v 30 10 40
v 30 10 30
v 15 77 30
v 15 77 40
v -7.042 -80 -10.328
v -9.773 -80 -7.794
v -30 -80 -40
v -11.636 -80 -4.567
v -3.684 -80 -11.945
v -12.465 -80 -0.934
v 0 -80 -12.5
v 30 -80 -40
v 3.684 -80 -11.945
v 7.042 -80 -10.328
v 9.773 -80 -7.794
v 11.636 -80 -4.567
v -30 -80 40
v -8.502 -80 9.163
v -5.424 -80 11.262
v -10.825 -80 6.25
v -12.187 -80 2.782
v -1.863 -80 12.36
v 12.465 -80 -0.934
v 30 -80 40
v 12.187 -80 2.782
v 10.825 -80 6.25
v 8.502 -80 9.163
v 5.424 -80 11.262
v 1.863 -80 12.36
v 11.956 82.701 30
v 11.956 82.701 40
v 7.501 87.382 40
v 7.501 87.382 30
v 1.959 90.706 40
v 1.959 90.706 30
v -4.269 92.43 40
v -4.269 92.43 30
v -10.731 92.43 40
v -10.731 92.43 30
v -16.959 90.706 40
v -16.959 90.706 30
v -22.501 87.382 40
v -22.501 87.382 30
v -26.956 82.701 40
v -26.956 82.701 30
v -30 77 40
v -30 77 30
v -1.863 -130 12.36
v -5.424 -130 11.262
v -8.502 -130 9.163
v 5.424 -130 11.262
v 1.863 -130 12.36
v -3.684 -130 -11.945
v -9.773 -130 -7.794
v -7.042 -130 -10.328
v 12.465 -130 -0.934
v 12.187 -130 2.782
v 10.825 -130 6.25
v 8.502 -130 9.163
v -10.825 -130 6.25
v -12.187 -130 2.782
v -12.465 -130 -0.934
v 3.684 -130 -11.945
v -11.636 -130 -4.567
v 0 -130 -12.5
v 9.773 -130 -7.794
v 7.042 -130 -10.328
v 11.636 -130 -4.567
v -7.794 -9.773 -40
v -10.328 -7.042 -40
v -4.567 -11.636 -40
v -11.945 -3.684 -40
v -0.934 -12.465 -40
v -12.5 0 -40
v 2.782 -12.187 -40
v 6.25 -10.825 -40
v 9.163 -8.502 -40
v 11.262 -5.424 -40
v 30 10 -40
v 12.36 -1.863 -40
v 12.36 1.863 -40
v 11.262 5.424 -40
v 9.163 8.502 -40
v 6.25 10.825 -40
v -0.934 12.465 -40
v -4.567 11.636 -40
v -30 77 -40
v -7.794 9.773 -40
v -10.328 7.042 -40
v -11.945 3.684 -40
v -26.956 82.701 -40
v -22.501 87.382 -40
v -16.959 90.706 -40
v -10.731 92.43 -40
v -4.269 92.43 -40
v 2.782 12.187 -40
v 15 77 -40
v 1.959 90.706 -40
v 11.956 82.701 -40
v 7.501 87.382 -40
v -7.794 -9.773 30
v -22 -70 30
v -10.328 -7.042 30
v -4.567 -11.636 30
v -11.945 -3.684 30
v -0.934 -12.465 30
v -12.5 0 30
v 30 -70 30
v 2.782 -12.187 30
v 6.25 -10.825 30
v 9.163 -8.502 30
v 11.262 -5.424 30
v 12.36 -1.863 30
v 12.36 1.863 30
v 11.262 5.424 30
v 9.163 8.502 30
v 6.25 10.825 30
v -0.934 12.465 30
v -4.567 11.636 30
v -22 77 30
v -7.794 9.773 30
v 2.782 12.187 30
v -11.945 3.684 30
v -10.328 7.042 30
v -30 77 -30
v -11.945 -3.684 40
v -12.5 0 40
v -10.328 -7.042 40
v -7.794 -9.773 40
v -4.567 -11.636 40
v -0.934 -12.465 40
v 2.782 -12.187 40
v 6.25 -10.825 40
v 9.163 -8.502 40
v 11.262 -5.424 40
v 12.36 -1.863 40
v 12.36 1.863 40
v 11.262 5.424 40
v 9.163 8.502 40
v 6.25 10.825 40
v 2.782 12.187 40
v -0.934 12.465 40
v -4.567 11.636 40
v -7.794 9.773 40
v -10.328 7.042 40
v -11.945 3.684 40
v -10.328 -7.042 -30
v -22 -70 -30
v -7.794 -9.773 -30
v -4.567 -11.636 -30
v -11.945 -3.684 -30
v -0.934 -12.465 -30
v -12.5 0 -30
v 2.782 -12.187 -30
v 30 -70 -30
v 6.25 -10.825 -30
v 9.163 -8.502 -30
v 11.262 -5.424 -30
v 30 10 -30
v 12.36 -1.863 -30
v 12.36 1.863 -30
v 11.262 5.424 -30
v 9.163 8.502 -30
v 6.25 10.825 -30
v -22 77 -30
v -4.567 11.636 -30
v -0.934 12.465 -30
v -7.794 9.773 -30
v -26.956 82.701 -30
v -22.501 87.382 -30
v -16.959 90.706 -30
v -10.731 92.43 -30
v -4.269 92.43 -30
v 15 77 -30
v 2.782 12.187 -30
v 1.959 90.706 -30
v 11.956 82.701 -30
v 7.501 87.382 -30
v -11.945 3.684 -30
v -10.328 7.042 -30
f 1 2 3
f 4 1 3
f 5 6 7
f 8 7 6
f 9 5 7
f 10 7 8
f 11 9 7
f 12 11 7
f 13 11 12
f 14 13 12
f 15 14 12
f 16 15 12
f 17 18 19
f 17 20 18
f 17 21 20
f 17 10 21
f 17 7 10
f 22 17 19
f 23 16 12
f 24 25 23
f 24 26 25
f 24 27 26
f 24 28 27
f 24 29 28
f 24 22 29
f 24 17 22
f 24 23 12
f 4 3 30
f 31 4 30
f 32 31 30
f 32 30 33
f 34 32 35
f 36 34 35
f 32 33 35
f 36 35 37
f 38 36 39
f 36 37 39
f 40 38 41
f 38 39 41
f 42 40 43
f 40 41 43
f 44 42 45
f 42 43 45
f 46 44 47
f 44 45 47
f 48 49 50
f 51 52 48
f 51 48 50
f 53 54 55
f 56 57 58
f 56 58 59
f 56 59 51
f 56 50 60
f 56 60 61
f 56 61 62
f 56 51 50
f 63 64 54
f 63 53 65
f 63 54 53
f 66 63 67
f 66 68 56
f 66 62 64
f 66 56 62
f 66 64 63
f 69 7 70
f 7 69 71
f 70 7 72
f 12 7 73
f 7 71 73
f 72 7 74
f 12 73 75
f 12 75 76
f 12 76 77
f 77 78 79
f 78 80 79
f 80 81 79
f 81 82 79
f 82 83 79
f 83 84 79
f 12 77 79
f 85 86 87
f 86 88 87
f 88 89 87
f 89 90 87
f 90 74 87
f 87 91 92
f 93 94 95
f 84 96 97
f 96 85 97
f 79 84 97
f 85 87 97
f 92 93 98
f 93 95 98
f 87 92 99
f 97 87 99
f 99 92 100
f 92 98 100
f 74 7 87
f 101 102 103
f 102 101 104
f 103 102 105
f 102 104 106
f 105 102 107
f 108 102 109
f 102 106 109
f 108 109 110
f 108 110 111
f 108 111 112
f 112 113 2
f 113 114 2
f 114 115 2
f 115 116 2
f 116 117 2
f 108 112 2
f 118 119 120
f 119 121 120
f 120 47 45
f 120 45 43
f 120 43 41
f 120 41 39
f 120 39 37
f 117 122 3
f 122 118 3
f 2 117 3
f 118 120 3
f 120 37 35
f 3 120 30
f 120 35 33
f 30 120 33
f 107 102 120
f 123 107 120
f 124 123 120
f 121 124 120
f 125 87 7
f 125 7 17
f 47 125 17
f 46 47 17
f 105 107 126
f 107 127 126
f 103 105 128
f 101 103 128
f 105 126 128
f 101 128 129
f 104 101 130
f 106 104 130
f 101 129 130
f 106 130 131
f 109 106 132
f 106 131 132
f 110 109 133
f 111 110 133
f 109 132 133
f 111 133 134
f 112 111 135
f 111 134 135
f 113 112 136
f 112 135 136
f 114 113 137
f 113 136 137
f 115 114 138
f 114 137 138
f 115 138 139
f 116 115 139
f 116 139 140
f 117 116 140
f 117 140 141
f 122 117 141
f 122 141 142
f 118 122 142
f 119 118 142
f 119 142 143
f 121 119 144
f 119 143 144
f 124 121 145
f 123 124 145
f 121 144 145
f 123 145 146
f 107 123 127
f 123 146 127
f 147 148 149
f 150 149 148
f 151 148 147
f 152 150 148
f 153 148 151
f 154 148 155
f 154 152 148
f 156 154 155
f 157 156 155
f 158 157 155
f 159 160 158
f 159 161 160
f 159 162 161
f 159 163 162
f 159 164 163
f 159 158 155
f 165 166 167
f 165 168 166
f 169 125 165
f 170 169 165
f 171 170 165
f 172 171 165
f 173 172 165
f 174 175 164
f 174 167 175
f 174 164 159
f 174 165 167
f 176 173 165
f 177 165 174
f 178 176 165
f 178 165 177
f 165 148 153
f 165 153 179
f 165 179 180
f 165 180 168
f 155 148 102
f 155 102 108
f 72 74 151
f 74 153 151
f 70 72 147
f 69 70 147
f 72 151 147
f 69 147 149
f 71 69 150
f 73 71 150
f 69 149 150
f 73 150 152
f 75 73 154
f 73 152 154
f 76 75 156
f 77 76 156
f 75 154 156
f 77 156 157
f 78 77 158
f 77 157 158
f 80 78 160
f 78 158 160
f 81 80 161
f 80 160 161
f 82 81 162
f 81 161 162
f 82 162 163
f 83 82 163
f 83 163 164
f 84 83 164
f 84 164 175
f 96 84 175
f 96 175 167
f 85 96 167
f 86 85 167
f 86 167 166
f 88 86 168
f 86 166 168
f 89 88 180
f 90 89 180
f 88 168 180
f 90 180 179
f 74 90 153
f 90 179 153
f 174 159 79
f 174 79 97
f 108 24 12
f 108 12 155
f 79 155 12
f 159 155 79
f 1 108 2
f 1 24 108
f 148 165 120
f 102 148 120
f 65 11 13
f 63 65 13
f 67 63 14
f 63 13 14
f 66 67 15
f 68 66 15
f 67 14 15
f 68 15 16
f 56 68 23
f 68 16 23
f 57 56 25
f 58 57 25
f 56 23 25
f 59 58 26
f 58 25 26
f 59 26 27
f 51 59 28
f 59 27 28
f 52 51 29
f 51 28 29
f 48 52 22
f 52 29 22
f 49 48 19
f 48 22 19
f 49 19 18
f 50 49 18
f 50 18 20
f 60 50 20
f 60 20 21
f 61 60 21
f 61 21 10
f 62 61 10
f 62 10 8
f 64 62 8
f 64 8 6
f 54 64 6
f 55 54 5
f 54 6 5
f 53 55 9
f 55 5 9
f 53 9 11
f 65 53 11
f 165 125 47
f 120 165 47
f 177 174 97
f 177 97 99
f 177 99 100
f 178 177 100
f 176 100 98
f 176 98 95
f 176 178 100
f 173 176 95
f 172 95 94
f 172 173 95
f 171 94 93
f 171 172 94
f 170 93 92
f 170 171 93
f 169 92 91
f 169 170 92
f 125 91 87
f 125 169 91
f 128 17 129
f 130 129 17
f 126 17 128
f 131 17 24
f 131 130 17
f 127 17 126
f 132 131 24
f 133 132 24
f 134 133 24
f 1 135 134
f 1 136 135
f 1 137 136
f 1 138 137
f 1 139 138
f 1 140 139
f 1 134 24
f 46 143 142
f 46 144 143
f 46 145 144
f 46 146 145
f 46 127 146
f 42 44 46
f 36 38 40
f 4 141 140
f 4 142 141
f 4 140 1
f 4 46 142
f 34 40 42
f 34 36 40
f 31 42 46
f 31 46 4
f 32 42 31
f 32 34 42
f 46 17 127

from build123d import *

# Parameters (mm, degrees)
BOSS_EXTRUDE1_DEPTH = 10
SKETCH4_W           = 60
SKETCH4_H           = 60
BOSS_EXTRUDE2_DEPTH = 10
SKETCH5_W           = 60
SKETCH5_H           = 147
BOSS_EXTRUDE3_DEPTH = 8
SKETCH6_R           = 12.5
CUT_EXTRUDE1_DEPTH  = 72
SKETCH7_R           = 12.5
BOSS_EXTRUDE4_DEPTH = 50


with BuildPart() as part:
    # Sketch2 → Boss-Extrude1 (new body)
    with BuildSketch(Plane.XY.offset(30)):
        with BuildLine():
            Line((0, -80), (30, -80))
            Line((30, -80), (30, 10))
            Line((30, 10), (15, 77))
            ThreePointArc((15, 77), (-7.5, 92.648353456), (-30, 77))
            Line((-30, 77), (-30, -80))
            Line((-30, -80), (0, -80))
        make_face()
    boss_extrude1 = extrude(amount=BOSS_EXTRUDE1_DEPTH)

    # Sketch4 → Boss-Extrude2 (add)
    with BuildSketch(Plane.XZ.offset(80)):
        Rectangle(SKETCH4_W, SKETCH4_H)
    extrude(amount=-BOSS_EXTRUDE2_DEPTH)

    # Mirror3: Boss-Extrude1 across plane
    add(boss_extrude1.mirror(Plane.XY))

    # Sketch5 → Boss-Extrude3 (add)
    with BuildSketch(Plane.ZY.offset(30)):
        with Locations((0, 3.5)):
            Rectangle(SKETCH5_W, SKETCH5_H)
    extrude(amount=-BOSS_EXTRUDE3_DEPTH)

    # Sketch6 → Cut-Extrude1 (cut, symmetric)
    with BuildSketch(Plane.XY):
        Circle(SKETCH6_R)
    extrude(amount=CUT_EXTRUDE1_DEPTH, both=True, mode=Mode.SUBTRACT)

    # Sketch7 → Boss-Extrude4 (add)
    with BuildSketch(Plane.XZ.offset(80)):
        Circle(SKETCH7_R)
    extrude(amount=BOSS_EXTRUDE4_DEPTH)


solid = part.part
